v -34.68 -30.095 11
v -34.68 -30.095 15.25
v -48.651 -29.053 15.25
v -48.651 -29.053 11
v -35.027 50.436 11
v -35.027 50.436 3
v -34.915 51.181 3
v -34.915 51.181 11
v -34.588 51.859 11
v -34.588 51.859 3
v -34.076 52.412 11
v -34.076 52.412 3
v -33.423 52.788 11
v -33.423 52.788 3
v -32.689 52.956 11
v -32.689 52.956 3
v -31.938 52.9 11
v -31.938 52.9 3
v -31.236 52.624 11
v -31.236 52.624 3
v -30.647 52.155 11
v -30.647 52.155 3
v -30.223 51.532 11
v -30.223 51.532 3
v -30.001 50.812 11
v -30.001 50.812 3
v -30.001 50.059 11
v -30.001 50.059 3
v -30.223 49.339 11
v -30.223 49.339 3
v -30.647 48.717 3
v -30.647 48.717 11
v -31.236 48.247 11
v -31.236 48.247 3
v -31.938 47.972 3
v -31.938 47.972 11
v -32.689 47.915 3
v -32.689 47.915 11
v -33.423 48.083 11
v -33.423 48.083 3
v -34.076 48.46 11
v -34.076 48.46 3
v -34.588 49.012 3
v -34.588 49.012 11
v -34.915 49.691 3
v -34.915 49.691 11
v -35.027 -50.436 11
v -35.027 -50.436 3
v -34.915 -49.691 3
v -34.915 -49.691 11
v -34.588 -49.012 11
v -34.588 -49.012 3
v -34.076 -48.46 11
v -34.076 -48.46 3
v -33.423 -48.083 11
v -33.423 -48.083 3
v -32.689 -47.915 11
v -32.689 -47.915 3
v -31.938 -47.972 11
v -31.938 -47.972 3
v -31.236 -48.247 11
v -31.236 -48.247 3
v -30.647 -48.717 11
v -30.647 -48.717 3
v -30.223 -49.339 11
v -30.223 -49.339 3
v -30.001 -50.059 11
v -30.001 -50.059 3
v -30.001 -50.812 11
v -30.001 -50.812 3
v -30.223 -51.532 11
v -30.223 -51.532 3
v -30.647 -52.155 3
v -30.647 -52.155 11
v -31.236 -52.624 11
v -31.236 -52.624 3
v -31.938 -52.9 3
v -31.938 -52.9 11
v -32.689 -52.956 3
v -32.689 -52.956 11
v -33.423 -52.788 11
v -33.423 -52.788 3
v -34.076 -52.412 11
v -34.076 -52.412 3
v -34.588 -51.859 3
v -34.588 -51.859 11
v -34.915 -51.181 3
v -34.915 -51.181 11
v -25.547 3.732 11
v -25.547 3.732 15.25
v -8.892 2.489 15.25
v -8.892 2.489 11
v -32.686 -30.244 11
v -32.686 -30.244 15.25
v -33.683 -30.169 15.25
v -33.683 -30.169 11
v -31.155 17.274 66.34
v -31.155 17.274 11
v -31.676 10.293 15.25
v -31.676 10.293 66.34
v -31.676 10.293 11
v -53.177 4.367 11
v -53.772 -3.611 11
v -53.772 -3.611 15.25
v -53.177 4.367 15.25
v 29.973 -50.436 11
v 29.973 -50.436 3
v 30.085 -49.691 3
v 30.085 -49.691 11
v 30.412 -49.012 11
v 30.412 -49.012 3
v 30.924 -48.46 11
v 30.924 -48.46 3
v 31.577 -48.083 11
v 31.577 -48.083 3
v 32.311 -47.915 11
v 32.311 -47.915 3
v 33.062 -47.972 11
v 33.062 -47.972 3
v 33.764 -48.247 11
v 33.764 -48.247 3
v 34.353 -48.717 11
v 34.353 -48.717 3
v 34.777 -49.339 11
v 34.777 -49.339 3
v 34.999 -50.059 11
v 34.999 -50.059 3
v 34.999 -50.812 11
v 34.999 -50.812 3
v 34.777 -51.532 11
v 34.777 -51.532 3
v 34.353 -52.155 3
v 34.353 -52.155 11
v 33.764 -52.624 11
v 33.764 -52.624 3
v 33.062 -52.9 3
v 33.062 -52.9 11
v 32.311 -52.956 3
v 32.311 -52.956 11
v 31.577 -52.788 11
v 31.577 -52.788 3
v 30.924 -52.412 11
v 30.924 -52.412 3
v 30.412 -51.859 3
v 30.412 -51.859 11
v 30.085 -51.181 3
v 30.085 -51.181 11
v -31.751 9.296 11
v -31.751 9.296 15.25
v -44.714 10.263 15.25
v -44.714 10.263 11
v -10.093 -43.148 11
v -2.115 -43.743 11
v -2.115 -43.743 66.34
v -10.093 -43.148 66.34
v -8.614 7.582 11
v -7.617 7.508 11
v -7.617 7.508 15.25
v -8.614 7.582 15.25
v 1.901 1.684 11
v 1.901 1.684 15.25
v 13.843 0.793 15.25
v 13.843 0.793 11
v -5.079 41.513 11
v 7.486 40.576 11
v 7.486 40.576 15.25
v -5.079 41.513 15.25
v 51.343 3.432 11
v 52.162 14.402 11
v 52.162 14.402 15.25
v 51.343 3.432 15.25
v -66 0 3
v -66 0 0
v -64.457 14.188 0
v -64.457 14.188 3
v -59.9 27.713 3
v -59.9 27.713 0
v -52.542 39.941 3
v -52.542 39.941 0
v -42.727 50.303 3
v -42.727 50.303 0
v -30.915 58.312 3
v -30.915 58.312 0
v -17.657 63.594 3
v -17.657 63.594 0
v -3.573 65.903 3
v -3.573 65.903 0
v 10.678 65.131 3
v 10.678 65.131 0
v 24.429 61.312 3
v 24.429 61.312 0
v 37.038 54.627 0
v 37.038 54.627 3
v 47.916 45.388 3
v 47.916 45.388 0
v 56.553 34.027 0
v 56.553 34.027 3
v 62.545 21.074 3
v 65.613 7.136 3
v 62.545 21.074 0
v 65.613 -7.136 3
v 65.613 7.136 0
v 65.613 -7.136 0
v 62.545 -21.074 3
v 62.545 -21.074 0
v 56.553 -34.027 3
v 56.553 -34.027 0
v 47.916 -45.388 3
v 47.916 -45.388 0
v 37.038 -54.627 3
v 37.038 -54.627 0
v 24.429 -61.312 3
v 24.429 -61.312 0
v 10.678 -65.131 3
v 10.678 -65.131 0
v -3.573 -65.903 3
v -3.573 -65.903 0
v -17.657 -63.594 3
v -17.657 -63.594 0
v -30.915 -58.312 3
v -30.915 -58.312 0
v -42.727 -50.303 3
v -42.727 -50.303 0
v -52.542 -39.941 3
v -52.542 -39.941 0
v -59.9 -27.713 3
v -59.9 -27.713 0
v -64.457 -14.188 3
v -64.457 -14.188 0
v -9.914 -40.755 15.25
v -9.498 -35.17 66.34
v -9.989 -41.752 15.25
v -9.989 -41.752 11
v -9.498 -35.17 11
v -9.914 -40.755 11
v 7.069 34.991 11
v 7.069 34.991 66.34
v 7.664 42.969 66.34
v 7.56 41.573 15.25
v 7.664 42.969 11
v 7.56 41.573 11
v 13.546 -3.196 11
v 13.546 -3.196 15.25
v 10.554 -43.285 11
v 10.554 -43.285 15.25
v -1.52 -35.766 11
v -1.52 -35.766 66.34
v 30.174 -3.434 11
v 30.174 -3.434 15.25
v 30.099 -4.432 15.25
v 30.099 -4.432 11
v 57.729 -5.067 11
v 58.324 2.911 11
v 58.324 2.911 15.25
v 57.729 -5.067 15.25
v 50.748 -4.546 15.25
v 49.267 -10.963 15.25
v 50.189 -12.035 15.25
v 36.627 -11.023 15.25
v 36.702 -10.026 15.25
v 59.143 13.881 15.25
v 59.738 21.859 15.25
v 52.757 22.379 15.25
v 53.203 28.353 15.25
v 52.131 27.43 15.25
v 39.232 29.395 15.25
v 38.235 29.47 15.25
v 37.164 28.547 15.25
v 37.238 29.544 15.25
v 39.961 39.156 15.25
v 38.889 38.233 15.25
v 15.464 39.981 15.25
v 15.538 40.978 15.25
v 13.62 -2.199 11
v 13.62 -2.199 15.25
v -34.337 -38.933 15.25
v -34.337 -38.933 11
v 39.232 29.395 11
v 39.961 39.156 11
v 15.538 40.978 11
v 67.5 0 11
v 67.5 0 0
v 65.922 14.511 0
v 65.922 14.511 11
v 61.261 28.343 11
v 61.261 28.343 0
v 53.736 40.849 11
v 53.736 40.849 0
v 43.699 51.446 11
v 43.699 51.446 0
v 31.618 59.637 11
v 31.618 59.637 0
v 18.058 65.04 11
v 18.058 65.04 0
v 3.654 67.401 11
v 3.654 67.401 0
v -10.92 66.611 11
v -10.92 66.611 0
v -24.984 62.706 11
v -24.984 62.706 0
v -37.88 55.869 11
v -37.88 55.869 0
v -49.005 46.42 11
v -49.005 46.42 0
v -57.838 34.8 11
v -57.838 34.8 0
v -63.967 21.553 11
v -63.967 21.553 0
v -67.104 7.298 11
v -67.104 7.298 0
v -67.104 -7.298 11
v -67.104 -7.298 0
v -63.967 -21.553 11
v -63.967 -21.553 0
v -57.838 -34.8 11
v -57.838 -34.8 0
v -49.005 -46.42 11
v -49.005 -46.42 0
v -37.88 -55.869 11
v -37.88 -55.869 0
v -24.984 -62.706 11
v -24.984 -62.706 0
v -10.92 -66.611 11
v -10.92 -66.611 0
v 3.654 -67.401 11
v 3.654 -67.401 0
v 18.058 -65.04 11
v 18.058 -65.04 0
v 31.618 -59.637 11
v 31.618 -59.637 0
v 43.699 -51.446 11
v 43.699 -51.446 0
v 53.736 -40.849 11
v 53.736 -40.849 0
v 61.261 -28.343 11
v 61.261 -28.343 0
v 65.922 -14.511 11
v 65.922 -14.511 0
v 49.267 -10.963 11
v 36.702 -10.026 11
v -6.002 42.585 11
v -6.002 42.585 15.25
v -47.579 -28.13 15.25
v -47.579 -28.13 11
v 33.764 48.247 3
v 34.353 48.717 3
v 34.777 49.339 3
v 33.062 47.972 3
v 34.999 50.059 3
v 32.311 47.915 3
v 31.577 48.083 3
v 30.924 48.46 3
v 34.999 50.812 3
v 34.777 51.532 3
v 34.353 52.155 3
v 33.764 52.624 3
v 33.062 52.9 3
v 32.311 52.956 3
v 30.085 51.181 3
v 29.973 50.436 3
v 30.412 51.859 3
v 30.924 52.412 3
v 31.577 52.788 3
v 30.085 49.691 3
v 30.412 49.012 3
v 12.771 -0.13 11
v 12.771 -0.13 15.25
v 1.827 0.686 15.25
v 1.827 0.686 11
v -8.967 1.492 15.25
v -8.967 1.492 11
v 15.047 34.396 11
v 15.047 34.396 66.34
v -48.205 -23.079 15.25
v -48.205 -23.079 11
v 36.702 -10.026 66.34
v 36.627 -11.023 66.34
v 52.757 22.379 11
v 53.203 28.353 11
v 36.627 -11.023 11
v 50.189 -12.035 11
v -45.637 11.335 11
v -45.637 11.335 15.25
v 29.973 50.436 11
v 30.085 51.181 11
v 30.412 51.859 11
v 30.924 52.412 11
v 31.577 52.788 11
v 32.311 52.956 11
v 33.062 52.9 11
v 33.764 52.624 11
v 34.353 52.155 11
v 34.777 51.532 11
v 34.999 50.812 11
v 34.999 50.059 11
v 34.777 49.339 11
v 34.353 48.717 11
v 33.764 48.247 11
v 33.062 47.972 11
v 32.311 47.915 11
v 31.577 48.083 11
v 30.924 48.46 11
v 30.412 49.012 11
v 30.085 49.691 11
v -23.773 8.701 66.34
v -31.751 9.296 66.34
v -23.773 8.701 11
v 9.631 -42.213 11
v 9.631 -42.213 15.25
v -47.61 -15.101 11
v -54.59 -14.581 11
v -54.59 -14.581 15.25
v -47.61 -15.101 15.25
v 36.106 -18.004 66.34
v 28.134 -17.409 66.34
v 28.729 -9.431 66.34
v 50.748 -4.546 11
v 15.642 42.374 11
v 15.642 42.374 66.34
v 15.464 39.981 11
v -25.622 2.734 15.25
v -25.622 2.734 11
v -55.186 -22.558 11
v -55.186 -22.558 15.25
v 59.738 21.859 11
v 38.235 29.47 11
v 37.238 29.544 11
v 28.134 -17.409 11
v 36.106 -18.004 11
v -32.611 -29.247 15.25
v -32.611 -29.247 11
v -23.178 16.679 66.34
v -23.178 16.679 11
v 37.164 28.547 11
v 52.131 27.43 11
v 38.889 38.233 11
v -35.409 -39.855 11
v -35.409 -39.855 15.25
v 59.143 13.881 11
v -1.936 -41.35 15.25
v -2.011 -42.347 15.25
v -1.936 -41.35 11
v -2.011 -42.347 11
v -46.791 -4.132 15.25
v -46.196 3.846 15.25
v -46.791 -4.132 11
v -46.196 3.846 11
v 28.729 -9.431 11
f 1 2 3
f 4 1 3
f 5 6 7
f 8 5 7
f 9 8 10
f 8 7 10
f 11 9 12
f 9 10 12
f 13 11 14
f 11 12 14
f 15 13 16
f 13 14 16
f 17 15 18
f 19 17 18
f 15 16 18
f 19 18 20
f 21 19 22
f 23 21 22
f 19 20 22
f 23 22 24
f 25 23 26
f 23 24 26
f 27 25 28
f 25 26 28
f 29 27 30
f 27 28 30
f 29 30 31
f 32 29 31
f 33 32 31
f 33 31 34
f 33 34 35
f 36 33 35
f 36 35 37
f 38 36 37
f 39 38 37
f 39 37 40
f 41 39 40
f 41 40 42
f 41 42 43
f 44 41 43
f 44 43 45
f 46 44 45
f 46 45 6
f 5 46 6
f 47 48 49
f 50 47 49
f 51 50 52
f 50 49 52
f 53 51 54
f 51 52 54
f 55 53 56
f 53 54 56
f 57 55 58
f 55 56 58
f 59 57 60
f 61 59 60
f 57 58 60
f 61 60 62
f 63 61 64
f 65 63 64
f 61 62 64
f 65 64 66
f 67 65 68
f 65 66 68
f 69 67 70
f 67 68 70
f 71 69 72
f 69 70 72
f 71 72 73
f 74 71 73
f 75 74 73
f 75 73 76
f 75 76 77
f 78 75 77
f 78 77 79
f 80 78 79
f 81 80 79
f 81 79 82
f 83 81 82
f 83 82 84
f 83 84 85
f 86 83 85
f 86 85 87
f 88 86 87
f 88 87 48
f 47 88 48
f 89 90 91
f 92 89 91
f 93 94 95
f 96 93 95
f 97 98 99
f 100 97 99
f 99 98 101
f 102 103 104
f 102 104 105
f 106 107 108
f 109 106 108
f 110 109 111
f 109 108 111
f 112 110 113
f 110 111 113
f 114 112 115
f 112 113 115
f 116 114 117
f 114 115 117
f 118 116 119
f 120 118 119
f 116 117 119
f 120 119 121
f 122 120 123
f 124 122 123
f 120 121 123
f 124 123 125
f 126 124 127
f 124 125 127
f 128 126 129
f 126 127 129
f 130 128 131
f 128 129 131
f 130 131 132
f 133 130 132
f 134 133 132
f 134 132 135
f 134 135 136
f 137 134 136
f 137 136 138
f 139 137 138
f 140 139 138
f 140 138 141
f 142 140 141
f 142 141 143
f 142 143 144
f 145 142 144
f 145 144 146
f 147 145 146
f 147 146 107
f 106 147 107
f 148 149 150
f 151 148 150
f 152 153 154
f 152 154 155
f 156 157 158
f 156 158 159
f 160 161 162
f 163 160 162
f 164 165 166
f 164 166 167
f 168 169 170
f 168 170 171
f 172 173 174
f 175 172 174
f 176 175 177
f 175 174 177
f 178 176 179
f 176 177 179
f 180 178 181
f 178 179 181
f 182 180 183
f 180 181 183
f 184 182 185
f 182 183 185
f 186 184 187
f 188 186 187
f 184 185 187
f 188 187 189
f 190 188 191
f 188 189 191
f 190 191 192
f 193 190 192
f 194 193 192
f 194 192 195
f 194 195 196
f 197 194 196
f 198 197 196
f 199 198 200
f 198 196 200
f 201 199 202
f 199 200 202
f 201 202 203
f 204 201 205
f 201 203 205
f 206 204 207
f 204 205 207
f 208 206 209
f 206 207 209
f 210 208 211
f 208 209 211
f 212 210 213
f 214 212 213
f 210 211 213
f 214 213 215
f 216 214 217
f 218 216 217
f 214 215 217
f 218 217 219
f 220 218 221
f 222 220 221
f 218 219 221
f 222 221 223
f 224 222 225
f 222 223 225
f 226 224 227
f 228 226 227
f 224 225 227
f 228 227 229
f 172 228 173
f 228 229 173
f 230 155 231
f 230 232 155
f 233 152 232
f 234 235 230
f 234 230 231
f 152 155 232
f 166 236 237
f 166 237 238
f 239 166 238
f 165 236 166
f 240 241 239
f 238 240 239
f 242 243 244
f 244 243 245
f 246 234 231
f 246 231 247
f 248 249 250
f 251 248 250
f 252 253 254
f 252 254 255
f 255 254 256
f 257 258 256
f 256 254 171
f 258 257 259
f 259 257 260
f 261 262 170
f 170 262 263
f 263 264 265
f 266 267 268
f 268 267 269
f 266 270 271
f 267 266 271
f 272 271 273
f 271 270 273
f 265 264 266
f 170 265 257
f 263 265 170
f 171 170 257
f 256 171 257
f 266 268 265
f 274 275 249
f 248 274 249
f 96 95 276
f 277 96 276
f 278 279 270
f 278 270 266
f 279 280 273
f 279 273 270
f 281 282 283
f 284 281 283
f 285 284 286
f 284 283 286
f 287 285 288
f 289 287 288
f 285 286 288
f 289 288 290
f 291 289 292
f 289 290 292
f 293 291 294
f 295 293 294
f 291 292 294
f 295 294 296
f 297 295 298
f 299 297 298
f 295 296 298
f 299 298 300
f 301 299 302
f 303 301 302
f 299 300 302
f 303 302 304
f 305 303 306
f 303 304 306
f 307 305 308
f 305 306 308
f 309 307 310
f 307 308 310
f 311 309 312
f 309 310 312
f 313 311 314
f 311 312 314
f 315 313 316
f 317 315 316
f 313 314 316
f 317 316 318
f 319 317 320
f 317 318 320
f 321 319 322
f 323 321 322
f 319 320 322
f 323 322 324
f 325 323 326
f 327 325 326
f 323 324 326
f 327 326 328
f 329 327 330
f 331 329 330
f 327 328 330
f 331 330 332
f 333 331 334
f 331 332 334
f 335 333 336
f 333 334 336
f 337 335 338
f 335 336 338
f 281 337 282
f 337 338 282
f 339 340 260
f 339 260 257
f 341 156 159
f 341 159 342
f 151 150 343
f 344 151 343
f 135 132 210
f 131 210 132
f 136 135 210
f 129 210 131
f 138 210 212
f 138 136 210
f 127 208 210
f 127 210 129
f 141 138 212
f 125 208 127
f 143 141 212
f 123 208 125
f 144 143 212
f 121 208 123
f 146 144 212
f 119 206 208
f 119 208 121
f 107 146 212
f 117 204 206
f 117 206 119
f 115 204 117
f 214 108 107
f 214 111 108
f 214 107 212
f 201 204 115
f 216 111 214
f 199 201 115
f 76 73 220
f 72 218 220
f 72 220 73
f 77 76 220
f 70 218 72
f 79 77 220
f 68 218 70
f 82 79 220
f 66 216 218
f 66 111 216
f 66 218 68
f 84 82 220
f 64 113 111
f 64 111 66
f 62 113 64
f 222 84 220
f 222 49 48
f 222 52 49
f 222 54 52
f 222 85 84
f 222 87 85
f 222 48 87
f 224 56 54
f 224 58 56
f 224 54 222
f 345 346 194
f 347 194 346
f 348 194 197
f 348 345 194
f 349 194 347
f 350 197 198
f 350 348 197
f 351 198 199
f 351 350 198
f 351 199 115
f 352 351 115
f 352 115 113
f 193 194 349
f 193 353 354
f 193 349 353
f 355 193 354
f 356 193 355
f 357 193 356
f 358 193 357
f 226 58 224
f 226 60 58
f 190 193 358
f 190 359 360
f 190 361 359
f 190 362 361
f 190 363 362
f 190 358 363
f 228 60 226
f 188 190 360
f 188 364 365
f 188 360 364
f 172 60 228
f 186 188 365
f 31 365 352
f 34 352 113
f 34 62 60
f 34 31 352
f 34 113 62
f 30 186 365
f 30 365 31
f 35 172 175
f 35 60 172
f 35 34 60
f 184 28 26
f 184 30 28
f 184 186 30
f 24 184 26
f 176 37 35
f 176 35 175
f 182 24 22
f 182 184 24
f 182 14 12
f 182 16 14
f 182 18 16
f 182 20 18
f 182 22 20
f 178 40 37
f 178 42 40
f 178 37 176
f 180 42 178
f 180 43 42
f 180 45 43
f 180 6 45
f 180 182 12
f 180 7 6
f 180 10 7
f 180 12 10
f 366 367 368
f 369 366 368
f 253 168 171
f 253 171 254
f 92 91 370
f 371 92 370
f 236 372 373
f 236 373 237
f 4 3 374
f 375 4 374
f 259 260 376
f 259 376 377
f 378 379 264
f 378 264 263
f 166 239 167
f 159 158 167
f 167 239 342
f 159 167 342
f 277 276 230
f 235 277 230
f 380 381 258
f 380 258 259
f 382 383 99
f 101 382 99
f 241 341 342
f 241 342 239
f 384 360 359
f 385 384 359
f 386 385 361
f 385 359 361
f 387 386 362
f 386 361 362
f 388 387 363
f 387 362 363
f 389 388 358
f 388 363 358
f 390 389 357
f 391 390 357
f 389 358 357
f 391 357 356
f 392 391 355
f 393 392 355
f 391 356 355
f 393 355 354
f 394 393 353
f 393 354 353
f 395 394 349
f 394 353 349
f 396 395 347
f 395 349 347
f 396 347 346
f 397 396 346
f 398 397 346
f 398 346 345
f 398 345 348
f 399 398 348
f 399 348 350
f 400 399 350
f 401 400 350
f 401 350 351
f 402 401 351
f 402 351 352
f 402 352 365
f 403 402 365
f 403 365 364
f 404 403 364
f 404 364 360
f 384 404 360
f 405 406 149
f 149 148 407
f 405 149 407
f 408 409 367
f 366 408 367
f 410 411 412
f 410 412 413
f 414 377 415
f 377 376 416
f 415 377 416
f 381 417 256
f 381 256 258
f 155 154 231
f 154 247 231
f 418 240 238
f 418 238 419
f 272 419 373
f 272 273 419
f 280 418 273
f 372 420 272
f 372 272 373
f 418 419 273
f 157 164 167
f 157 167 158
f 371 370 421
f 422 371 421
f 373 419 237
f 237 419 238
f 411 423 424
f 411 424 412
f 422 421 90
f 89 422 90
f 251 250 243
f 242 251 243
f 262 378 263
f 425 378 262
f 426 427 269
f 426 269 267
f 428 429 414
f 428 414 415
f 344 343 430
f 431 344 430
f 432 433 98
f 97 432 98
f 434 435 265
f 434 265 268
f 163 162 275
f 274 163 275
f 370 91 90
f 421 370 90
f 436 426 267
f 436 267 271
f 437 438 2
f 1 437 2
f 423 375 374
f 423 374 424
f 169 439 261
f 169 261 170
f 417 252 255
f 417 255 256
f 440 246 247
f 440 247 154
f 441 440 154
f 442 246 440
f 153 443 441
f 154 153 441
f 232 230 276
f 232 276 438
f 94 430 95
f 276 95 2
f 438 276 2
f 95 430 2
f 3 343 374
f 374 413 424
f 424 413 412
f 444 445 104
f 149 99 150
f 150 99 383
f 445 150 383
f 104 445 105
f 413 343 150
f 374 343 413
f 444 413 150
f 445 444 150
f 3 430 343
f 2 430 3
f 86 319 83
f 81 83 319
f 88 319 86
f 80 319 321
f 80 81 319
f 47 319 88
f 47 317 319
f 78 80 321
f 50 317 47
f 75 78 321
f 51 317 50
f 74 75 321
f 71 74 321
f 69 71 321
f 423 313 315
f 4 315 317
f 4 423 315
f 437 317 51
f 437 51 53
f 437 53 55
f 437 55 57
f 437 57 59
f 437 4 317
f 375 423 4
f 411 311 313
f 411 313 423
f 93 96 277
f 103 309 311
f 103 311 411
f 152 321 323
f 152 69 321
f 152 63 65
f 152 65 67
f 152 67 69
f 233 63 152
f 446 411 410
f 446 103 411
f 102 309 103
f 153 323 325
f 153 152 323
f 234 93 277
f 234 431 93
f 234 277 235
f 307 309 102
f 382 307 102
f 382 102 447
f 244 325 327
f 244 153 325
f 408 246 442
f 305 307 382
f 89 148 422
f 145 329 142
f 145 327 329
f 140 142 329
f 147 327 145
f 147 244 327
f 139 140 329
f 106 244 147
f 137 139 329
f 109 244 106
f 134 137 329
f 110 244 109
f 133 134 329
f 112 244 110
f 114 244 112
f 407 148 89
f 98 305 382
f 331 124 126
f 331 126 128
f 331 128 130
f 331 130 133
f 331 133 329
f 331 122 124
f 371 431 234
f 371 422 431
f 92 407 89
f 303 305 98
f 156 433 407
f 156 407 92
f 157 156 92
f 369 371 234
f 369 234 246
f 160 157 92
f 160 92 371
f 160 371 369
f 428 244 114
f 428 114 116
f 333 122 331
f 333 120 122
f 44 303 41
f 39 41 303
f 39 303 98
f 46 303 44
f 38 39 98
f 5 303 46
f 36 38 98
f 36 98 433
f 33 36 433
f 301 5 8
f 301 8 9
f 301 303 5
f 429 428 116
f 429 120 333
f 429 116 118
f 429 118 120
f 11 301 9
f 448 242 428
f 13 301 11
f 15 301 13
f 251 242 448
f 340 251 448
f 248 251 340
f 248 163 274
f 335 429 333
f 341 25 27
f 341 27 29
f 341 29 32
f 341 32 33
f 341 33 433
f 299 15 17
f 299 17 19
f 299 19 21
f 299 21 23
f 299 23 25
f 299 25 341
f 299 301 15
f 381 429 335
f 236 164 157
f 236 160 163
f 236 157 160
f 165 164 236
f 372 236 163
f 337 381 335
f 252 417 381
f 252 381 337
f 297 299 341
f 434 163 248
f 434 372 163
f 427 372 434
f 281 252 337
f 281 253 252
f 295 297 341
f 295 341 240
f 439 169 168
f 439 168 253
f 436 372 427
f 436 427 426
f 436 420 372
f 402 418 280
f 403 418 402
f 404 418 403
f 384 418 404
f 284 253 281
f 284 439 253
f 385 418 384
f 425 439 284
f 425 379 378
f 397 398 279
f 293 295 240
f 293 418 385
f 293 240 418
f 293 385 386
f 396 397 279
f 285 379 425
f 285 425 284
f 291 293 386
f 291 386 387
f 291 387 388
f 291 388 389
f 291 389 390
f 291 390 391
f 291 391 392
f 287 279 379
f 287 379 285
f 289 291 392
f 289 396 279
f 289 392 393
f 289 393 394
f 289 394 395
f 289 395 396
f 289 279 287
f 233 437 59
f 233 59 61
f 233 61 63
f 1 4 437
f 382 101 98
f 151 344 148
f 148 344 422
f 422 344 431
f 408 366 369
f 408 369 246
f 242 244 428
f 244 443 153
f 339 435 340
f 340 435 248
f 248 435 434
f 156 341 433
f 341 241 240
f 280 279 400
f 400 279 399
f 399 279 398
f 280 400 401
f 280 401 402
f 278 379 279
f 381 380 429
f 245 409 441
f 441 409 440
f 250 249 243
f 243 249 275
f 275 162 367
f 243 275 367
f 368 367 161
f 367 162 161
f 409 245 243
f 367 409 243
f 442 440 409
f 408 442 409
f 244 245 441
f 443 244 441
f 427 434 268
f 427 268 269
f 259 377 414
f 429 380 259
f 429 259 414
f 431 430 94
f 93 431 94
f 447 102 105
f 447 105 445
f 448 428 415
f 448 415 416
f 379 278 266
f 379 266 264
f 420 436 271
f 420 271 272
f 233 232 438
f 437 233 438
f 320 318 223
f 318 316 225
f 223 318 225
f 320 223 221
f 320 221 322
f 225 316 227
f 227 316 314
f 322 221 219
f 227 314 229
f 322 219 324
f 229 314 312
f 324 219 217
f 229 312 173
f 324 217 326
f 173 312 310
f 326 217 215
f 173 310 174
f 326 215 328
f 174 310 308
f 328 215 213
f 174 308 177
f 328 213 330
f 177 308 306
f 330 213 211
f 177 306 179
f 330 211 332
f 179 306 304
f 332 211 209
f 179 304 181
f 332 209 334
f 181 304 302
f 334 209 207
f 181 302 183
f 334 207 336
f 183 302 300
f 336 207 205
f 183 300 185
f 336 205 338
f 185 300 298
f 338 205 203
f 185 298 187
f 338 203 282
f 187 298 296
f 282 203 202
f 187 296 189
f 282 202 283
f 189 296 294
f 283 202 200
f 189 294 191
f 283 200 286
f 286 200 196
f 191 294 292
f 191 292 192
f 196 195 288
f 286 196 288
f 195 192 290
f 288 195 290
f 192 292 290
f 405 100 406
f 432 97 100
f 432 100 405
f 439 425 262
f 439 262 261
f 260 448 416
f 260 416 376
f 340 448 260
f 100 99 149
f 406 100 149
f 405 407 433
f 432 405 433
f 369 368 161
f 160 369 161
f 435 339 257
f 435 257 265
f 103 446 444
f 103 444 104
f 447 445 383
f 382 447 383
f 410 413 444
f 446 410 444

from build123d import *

# Parameters (mm, degrees)
SKETCH2_R            = 67.5
BOSS_EXTRUDE2_DEPTH  = 11
SKETCH3_R            = 66
CUT_EXTRUDE11_DEPTH  = 3
BOSS_EXTRUDE3_DEPTH  = 63.34
BOSS_EXTRUDE10_DEPTH = 12.25
BOSS_EXTRUDE11_DEPTH = 12.25
BOSS_EXTRUDE12_START = -12.25
BOSS_EXTRUDE12_DEPTH = 4.25
BOSS_EXTRUDE13_DEPTH = 12.25
SKETCH4_10_R         = 2.5273
CUT_EXTRUDE12_DEPTH  = 12.25


# Read off the part's stored shape, not the designer's step: Boss-Extrude12
with BuildPart() as part:
    # Sketch2 → Boss-Extrude2 (new body)
    with BuildSketch(Plane.XY):
        Circle(SKETCH2_R)
    extrude(amount=BOSS_EXTRUDE2_DEPTH)

    # Sketch3 → Cut-Extrude11 (cut)
    with BuildSketch(Plane(origin=(0, 0, 0), x_dir=(-1, 0, 0), z_dir=(0, 0, -1))):
        Circle(SKETCH3_R)
    extrude(amount=-CUT_EXTRUDE11_DEPTH, mode=Mode.SUBTRACT)

    # Sketch4 → Boss-Extrude3 (add)
    with BuildSketch(Plane(origin=(0, 0, 3), x_dir=(-1, 0, 0), z_dir=(0, 0, -1))):
        Polygon((-36.106368438, -18.003584956), (-28.133944044, -17.408739697), (-28.729209741, -9.430900362), (-36.701616568, -10.025761076), (-36.627210549, -11.022989106), align=None)
        Polygon((2.114943846, -43.743465349), (10.09276687, -43.148200869), (9.49750239, -35.170377845), (1.519679366, -35.765642325), align=None)
        Polygon((31.67620014, 10.293427606), (31.75060616, 9.296199576), (23.772783163, 8.700934735), (23.177535005, 16.678758977), (31.155358029, 17.274023457), align=None)
        Polygon((-7.664290982, 42.969259013), (-15.642114006, 42.373994533), (-15.046849526, 34.396171509), (-7.069026502, 34.991435989), align=None)
    extrude(amount=-BOSS_EXTRUDE3_DEPTH)



with BuildPart() as body_2:
    # Sketch4<6> → Boss-Extrude10 (new body)
    with BuildSketch(Plane(origin=(0, 0, 3), x_dir=(-1, 0, 0), z_dir=(0, 0, -1))):
        Polygon((-37.237933985, 29.544025614), (-53.20294076, 28.352798205), (-50.189331626, -12.034925436), (-36.627210549, -11.022989106), (-36.701616568, -10.025761076), (-49.266513848, -10.96328965), (-52.131302781, 27.429978539), (-37.163525925, 28.546797736), align=None)
    extrude(amount=-BOSS_EXTRUDE10_DEPTH)


with BuildPart() as part_1:
    add(part.part)

    add(body_2.part)  # Boss-Extrude11 merges body 2
    # Sketch4<7> → Boss-Extrude11 (add)
    with BuildSketch(Plane(origin=(0, 0, 3), x_dir=(-1, 0, 0), z_dir=(0, 0, -1))):
        Polygon((-15.463534662, 39.980647626), (-15.537942722, 40.977875504), (-39.960658599, 39.155576962), (-39.232389741, 29.395209494), (-38.235161863, 29.469617554), (-38.889022661, 38.232757144), align=None)
        Polygon((6.002179443, 42.585089599), (-7.560119698, 41.573139984), (-7.485711638, 40.575912106), (5.079359625, 41.513453661), (7.61667447, 7.507983023), (8.613902348, 7.582391083), align=None)
    extrude(amount=-BOSS_EXTRUDE11_DEPTH)

    # Boss-Extrude12 outline → Boss-Extrude12 (add)
    with BuildSketch(Plane(origin=(0, 0, 3), x_dir=(-1, 0, 0), z_dir=(0, 0, -1)).offset(BOSS_EXTRUDE12_START)):
        Polygon((31.67620014, 10.293427606), (31.75060616, 9.296199576), (44.714394547, 10.263491961), (47.579183525, -28.129776815), (32.611406667, -29.246596012), (32.685814727, -30.24382389), (33.683042605, -30.16941583), (34.336903403, -38.93255542), (9.914187526, -40.754853962), (9.988595586, -41.75208184), (35.408539341, -39.855375238), (34.680270483, -30.09500777), (48.650821503, -29.05259648), (45.637212368, 11.33512716), align=None)
        Polygon((-13.619910772, -2.199099303), (-30.173893546, -3.434273099), (-30.099485486, -4.431500977), (-13.545502712, -3.196327181), (-10.5542987, -43.284887875), (2.010772562, -42.347346319), (1.936364502, -41.350118441), (-9.631478882, -42.213251937), (-12.771499014, -0.130235487), (-1.826827461, 0.686400104), (-1.901235521, 1.683627982), (-13.843134952, 0.792584331), align=None)
        Polygon((25.621774288, 2.734474823), (25.547366228, 3.731702701), (8.892344879, 2.488989922), (8.966752939, 1.491762044), align=None)
    extrude(amount=BOSS_EXTRUDE12_DEPTH)

    # Sketch4<9> → Boss-Extrude13 (add)
    with BuildSketch(Plane(origin=(0, 0, 3), x_dir=(-1, 0, 0), z_dir=(0, 0, -1))):
        Polygon((-50.748151509, -4.545744855), (-51.343432315, 3.432076951), (-58.324046353, 2.911219122), (-57.728798463, -5.06660514), align=None)
        Polygon((-52.161943422, 14.401581934), (-52.757224228, 22.379403739), (-59.737760091, 21.858551743), (-59.142512201, 13.880727481), align=None)
        Polygon((46.196032252, 3.845946579), (46.791313057, -4.131875227), (53.771927095, -3.611017397), (53.176679206, 4.366806864), align=None)
        Polygon((47.609824165, -15.10138021), (48.205104971, -23.079202015), (55.185640833, -22.558350019), (54.590392944, -14.580525757), align=None)
    extrude(amount=-BOSS_EXTRUDE13_DEPTH)

    # Sketch4<10> → Cut-Extrude12 (cut)
    with BuildSketch(Plane(origin=(0, 0, 3), x_dir=(-1, 0, 0), z_dir=(0, 0, -1))):
        with Locations((-32.5, 50.435602505)):
            Circle(SKETCH4_10_R)
        with Locations((-32.5, -50.435602505)):
            Circle(SKETCH4_10_R)
        with Locations((32.5, -50.435602505)):
            Circle(SKETCH4_10_R)
        with Locations((32.5, 50.435602505)):
            Circle(SKETCH4_10_R)
    extrude(amount=-CUT_EXTRUDE12_DEPTH, mode=Mode.SUBTRACT)


solid = part_1.part
